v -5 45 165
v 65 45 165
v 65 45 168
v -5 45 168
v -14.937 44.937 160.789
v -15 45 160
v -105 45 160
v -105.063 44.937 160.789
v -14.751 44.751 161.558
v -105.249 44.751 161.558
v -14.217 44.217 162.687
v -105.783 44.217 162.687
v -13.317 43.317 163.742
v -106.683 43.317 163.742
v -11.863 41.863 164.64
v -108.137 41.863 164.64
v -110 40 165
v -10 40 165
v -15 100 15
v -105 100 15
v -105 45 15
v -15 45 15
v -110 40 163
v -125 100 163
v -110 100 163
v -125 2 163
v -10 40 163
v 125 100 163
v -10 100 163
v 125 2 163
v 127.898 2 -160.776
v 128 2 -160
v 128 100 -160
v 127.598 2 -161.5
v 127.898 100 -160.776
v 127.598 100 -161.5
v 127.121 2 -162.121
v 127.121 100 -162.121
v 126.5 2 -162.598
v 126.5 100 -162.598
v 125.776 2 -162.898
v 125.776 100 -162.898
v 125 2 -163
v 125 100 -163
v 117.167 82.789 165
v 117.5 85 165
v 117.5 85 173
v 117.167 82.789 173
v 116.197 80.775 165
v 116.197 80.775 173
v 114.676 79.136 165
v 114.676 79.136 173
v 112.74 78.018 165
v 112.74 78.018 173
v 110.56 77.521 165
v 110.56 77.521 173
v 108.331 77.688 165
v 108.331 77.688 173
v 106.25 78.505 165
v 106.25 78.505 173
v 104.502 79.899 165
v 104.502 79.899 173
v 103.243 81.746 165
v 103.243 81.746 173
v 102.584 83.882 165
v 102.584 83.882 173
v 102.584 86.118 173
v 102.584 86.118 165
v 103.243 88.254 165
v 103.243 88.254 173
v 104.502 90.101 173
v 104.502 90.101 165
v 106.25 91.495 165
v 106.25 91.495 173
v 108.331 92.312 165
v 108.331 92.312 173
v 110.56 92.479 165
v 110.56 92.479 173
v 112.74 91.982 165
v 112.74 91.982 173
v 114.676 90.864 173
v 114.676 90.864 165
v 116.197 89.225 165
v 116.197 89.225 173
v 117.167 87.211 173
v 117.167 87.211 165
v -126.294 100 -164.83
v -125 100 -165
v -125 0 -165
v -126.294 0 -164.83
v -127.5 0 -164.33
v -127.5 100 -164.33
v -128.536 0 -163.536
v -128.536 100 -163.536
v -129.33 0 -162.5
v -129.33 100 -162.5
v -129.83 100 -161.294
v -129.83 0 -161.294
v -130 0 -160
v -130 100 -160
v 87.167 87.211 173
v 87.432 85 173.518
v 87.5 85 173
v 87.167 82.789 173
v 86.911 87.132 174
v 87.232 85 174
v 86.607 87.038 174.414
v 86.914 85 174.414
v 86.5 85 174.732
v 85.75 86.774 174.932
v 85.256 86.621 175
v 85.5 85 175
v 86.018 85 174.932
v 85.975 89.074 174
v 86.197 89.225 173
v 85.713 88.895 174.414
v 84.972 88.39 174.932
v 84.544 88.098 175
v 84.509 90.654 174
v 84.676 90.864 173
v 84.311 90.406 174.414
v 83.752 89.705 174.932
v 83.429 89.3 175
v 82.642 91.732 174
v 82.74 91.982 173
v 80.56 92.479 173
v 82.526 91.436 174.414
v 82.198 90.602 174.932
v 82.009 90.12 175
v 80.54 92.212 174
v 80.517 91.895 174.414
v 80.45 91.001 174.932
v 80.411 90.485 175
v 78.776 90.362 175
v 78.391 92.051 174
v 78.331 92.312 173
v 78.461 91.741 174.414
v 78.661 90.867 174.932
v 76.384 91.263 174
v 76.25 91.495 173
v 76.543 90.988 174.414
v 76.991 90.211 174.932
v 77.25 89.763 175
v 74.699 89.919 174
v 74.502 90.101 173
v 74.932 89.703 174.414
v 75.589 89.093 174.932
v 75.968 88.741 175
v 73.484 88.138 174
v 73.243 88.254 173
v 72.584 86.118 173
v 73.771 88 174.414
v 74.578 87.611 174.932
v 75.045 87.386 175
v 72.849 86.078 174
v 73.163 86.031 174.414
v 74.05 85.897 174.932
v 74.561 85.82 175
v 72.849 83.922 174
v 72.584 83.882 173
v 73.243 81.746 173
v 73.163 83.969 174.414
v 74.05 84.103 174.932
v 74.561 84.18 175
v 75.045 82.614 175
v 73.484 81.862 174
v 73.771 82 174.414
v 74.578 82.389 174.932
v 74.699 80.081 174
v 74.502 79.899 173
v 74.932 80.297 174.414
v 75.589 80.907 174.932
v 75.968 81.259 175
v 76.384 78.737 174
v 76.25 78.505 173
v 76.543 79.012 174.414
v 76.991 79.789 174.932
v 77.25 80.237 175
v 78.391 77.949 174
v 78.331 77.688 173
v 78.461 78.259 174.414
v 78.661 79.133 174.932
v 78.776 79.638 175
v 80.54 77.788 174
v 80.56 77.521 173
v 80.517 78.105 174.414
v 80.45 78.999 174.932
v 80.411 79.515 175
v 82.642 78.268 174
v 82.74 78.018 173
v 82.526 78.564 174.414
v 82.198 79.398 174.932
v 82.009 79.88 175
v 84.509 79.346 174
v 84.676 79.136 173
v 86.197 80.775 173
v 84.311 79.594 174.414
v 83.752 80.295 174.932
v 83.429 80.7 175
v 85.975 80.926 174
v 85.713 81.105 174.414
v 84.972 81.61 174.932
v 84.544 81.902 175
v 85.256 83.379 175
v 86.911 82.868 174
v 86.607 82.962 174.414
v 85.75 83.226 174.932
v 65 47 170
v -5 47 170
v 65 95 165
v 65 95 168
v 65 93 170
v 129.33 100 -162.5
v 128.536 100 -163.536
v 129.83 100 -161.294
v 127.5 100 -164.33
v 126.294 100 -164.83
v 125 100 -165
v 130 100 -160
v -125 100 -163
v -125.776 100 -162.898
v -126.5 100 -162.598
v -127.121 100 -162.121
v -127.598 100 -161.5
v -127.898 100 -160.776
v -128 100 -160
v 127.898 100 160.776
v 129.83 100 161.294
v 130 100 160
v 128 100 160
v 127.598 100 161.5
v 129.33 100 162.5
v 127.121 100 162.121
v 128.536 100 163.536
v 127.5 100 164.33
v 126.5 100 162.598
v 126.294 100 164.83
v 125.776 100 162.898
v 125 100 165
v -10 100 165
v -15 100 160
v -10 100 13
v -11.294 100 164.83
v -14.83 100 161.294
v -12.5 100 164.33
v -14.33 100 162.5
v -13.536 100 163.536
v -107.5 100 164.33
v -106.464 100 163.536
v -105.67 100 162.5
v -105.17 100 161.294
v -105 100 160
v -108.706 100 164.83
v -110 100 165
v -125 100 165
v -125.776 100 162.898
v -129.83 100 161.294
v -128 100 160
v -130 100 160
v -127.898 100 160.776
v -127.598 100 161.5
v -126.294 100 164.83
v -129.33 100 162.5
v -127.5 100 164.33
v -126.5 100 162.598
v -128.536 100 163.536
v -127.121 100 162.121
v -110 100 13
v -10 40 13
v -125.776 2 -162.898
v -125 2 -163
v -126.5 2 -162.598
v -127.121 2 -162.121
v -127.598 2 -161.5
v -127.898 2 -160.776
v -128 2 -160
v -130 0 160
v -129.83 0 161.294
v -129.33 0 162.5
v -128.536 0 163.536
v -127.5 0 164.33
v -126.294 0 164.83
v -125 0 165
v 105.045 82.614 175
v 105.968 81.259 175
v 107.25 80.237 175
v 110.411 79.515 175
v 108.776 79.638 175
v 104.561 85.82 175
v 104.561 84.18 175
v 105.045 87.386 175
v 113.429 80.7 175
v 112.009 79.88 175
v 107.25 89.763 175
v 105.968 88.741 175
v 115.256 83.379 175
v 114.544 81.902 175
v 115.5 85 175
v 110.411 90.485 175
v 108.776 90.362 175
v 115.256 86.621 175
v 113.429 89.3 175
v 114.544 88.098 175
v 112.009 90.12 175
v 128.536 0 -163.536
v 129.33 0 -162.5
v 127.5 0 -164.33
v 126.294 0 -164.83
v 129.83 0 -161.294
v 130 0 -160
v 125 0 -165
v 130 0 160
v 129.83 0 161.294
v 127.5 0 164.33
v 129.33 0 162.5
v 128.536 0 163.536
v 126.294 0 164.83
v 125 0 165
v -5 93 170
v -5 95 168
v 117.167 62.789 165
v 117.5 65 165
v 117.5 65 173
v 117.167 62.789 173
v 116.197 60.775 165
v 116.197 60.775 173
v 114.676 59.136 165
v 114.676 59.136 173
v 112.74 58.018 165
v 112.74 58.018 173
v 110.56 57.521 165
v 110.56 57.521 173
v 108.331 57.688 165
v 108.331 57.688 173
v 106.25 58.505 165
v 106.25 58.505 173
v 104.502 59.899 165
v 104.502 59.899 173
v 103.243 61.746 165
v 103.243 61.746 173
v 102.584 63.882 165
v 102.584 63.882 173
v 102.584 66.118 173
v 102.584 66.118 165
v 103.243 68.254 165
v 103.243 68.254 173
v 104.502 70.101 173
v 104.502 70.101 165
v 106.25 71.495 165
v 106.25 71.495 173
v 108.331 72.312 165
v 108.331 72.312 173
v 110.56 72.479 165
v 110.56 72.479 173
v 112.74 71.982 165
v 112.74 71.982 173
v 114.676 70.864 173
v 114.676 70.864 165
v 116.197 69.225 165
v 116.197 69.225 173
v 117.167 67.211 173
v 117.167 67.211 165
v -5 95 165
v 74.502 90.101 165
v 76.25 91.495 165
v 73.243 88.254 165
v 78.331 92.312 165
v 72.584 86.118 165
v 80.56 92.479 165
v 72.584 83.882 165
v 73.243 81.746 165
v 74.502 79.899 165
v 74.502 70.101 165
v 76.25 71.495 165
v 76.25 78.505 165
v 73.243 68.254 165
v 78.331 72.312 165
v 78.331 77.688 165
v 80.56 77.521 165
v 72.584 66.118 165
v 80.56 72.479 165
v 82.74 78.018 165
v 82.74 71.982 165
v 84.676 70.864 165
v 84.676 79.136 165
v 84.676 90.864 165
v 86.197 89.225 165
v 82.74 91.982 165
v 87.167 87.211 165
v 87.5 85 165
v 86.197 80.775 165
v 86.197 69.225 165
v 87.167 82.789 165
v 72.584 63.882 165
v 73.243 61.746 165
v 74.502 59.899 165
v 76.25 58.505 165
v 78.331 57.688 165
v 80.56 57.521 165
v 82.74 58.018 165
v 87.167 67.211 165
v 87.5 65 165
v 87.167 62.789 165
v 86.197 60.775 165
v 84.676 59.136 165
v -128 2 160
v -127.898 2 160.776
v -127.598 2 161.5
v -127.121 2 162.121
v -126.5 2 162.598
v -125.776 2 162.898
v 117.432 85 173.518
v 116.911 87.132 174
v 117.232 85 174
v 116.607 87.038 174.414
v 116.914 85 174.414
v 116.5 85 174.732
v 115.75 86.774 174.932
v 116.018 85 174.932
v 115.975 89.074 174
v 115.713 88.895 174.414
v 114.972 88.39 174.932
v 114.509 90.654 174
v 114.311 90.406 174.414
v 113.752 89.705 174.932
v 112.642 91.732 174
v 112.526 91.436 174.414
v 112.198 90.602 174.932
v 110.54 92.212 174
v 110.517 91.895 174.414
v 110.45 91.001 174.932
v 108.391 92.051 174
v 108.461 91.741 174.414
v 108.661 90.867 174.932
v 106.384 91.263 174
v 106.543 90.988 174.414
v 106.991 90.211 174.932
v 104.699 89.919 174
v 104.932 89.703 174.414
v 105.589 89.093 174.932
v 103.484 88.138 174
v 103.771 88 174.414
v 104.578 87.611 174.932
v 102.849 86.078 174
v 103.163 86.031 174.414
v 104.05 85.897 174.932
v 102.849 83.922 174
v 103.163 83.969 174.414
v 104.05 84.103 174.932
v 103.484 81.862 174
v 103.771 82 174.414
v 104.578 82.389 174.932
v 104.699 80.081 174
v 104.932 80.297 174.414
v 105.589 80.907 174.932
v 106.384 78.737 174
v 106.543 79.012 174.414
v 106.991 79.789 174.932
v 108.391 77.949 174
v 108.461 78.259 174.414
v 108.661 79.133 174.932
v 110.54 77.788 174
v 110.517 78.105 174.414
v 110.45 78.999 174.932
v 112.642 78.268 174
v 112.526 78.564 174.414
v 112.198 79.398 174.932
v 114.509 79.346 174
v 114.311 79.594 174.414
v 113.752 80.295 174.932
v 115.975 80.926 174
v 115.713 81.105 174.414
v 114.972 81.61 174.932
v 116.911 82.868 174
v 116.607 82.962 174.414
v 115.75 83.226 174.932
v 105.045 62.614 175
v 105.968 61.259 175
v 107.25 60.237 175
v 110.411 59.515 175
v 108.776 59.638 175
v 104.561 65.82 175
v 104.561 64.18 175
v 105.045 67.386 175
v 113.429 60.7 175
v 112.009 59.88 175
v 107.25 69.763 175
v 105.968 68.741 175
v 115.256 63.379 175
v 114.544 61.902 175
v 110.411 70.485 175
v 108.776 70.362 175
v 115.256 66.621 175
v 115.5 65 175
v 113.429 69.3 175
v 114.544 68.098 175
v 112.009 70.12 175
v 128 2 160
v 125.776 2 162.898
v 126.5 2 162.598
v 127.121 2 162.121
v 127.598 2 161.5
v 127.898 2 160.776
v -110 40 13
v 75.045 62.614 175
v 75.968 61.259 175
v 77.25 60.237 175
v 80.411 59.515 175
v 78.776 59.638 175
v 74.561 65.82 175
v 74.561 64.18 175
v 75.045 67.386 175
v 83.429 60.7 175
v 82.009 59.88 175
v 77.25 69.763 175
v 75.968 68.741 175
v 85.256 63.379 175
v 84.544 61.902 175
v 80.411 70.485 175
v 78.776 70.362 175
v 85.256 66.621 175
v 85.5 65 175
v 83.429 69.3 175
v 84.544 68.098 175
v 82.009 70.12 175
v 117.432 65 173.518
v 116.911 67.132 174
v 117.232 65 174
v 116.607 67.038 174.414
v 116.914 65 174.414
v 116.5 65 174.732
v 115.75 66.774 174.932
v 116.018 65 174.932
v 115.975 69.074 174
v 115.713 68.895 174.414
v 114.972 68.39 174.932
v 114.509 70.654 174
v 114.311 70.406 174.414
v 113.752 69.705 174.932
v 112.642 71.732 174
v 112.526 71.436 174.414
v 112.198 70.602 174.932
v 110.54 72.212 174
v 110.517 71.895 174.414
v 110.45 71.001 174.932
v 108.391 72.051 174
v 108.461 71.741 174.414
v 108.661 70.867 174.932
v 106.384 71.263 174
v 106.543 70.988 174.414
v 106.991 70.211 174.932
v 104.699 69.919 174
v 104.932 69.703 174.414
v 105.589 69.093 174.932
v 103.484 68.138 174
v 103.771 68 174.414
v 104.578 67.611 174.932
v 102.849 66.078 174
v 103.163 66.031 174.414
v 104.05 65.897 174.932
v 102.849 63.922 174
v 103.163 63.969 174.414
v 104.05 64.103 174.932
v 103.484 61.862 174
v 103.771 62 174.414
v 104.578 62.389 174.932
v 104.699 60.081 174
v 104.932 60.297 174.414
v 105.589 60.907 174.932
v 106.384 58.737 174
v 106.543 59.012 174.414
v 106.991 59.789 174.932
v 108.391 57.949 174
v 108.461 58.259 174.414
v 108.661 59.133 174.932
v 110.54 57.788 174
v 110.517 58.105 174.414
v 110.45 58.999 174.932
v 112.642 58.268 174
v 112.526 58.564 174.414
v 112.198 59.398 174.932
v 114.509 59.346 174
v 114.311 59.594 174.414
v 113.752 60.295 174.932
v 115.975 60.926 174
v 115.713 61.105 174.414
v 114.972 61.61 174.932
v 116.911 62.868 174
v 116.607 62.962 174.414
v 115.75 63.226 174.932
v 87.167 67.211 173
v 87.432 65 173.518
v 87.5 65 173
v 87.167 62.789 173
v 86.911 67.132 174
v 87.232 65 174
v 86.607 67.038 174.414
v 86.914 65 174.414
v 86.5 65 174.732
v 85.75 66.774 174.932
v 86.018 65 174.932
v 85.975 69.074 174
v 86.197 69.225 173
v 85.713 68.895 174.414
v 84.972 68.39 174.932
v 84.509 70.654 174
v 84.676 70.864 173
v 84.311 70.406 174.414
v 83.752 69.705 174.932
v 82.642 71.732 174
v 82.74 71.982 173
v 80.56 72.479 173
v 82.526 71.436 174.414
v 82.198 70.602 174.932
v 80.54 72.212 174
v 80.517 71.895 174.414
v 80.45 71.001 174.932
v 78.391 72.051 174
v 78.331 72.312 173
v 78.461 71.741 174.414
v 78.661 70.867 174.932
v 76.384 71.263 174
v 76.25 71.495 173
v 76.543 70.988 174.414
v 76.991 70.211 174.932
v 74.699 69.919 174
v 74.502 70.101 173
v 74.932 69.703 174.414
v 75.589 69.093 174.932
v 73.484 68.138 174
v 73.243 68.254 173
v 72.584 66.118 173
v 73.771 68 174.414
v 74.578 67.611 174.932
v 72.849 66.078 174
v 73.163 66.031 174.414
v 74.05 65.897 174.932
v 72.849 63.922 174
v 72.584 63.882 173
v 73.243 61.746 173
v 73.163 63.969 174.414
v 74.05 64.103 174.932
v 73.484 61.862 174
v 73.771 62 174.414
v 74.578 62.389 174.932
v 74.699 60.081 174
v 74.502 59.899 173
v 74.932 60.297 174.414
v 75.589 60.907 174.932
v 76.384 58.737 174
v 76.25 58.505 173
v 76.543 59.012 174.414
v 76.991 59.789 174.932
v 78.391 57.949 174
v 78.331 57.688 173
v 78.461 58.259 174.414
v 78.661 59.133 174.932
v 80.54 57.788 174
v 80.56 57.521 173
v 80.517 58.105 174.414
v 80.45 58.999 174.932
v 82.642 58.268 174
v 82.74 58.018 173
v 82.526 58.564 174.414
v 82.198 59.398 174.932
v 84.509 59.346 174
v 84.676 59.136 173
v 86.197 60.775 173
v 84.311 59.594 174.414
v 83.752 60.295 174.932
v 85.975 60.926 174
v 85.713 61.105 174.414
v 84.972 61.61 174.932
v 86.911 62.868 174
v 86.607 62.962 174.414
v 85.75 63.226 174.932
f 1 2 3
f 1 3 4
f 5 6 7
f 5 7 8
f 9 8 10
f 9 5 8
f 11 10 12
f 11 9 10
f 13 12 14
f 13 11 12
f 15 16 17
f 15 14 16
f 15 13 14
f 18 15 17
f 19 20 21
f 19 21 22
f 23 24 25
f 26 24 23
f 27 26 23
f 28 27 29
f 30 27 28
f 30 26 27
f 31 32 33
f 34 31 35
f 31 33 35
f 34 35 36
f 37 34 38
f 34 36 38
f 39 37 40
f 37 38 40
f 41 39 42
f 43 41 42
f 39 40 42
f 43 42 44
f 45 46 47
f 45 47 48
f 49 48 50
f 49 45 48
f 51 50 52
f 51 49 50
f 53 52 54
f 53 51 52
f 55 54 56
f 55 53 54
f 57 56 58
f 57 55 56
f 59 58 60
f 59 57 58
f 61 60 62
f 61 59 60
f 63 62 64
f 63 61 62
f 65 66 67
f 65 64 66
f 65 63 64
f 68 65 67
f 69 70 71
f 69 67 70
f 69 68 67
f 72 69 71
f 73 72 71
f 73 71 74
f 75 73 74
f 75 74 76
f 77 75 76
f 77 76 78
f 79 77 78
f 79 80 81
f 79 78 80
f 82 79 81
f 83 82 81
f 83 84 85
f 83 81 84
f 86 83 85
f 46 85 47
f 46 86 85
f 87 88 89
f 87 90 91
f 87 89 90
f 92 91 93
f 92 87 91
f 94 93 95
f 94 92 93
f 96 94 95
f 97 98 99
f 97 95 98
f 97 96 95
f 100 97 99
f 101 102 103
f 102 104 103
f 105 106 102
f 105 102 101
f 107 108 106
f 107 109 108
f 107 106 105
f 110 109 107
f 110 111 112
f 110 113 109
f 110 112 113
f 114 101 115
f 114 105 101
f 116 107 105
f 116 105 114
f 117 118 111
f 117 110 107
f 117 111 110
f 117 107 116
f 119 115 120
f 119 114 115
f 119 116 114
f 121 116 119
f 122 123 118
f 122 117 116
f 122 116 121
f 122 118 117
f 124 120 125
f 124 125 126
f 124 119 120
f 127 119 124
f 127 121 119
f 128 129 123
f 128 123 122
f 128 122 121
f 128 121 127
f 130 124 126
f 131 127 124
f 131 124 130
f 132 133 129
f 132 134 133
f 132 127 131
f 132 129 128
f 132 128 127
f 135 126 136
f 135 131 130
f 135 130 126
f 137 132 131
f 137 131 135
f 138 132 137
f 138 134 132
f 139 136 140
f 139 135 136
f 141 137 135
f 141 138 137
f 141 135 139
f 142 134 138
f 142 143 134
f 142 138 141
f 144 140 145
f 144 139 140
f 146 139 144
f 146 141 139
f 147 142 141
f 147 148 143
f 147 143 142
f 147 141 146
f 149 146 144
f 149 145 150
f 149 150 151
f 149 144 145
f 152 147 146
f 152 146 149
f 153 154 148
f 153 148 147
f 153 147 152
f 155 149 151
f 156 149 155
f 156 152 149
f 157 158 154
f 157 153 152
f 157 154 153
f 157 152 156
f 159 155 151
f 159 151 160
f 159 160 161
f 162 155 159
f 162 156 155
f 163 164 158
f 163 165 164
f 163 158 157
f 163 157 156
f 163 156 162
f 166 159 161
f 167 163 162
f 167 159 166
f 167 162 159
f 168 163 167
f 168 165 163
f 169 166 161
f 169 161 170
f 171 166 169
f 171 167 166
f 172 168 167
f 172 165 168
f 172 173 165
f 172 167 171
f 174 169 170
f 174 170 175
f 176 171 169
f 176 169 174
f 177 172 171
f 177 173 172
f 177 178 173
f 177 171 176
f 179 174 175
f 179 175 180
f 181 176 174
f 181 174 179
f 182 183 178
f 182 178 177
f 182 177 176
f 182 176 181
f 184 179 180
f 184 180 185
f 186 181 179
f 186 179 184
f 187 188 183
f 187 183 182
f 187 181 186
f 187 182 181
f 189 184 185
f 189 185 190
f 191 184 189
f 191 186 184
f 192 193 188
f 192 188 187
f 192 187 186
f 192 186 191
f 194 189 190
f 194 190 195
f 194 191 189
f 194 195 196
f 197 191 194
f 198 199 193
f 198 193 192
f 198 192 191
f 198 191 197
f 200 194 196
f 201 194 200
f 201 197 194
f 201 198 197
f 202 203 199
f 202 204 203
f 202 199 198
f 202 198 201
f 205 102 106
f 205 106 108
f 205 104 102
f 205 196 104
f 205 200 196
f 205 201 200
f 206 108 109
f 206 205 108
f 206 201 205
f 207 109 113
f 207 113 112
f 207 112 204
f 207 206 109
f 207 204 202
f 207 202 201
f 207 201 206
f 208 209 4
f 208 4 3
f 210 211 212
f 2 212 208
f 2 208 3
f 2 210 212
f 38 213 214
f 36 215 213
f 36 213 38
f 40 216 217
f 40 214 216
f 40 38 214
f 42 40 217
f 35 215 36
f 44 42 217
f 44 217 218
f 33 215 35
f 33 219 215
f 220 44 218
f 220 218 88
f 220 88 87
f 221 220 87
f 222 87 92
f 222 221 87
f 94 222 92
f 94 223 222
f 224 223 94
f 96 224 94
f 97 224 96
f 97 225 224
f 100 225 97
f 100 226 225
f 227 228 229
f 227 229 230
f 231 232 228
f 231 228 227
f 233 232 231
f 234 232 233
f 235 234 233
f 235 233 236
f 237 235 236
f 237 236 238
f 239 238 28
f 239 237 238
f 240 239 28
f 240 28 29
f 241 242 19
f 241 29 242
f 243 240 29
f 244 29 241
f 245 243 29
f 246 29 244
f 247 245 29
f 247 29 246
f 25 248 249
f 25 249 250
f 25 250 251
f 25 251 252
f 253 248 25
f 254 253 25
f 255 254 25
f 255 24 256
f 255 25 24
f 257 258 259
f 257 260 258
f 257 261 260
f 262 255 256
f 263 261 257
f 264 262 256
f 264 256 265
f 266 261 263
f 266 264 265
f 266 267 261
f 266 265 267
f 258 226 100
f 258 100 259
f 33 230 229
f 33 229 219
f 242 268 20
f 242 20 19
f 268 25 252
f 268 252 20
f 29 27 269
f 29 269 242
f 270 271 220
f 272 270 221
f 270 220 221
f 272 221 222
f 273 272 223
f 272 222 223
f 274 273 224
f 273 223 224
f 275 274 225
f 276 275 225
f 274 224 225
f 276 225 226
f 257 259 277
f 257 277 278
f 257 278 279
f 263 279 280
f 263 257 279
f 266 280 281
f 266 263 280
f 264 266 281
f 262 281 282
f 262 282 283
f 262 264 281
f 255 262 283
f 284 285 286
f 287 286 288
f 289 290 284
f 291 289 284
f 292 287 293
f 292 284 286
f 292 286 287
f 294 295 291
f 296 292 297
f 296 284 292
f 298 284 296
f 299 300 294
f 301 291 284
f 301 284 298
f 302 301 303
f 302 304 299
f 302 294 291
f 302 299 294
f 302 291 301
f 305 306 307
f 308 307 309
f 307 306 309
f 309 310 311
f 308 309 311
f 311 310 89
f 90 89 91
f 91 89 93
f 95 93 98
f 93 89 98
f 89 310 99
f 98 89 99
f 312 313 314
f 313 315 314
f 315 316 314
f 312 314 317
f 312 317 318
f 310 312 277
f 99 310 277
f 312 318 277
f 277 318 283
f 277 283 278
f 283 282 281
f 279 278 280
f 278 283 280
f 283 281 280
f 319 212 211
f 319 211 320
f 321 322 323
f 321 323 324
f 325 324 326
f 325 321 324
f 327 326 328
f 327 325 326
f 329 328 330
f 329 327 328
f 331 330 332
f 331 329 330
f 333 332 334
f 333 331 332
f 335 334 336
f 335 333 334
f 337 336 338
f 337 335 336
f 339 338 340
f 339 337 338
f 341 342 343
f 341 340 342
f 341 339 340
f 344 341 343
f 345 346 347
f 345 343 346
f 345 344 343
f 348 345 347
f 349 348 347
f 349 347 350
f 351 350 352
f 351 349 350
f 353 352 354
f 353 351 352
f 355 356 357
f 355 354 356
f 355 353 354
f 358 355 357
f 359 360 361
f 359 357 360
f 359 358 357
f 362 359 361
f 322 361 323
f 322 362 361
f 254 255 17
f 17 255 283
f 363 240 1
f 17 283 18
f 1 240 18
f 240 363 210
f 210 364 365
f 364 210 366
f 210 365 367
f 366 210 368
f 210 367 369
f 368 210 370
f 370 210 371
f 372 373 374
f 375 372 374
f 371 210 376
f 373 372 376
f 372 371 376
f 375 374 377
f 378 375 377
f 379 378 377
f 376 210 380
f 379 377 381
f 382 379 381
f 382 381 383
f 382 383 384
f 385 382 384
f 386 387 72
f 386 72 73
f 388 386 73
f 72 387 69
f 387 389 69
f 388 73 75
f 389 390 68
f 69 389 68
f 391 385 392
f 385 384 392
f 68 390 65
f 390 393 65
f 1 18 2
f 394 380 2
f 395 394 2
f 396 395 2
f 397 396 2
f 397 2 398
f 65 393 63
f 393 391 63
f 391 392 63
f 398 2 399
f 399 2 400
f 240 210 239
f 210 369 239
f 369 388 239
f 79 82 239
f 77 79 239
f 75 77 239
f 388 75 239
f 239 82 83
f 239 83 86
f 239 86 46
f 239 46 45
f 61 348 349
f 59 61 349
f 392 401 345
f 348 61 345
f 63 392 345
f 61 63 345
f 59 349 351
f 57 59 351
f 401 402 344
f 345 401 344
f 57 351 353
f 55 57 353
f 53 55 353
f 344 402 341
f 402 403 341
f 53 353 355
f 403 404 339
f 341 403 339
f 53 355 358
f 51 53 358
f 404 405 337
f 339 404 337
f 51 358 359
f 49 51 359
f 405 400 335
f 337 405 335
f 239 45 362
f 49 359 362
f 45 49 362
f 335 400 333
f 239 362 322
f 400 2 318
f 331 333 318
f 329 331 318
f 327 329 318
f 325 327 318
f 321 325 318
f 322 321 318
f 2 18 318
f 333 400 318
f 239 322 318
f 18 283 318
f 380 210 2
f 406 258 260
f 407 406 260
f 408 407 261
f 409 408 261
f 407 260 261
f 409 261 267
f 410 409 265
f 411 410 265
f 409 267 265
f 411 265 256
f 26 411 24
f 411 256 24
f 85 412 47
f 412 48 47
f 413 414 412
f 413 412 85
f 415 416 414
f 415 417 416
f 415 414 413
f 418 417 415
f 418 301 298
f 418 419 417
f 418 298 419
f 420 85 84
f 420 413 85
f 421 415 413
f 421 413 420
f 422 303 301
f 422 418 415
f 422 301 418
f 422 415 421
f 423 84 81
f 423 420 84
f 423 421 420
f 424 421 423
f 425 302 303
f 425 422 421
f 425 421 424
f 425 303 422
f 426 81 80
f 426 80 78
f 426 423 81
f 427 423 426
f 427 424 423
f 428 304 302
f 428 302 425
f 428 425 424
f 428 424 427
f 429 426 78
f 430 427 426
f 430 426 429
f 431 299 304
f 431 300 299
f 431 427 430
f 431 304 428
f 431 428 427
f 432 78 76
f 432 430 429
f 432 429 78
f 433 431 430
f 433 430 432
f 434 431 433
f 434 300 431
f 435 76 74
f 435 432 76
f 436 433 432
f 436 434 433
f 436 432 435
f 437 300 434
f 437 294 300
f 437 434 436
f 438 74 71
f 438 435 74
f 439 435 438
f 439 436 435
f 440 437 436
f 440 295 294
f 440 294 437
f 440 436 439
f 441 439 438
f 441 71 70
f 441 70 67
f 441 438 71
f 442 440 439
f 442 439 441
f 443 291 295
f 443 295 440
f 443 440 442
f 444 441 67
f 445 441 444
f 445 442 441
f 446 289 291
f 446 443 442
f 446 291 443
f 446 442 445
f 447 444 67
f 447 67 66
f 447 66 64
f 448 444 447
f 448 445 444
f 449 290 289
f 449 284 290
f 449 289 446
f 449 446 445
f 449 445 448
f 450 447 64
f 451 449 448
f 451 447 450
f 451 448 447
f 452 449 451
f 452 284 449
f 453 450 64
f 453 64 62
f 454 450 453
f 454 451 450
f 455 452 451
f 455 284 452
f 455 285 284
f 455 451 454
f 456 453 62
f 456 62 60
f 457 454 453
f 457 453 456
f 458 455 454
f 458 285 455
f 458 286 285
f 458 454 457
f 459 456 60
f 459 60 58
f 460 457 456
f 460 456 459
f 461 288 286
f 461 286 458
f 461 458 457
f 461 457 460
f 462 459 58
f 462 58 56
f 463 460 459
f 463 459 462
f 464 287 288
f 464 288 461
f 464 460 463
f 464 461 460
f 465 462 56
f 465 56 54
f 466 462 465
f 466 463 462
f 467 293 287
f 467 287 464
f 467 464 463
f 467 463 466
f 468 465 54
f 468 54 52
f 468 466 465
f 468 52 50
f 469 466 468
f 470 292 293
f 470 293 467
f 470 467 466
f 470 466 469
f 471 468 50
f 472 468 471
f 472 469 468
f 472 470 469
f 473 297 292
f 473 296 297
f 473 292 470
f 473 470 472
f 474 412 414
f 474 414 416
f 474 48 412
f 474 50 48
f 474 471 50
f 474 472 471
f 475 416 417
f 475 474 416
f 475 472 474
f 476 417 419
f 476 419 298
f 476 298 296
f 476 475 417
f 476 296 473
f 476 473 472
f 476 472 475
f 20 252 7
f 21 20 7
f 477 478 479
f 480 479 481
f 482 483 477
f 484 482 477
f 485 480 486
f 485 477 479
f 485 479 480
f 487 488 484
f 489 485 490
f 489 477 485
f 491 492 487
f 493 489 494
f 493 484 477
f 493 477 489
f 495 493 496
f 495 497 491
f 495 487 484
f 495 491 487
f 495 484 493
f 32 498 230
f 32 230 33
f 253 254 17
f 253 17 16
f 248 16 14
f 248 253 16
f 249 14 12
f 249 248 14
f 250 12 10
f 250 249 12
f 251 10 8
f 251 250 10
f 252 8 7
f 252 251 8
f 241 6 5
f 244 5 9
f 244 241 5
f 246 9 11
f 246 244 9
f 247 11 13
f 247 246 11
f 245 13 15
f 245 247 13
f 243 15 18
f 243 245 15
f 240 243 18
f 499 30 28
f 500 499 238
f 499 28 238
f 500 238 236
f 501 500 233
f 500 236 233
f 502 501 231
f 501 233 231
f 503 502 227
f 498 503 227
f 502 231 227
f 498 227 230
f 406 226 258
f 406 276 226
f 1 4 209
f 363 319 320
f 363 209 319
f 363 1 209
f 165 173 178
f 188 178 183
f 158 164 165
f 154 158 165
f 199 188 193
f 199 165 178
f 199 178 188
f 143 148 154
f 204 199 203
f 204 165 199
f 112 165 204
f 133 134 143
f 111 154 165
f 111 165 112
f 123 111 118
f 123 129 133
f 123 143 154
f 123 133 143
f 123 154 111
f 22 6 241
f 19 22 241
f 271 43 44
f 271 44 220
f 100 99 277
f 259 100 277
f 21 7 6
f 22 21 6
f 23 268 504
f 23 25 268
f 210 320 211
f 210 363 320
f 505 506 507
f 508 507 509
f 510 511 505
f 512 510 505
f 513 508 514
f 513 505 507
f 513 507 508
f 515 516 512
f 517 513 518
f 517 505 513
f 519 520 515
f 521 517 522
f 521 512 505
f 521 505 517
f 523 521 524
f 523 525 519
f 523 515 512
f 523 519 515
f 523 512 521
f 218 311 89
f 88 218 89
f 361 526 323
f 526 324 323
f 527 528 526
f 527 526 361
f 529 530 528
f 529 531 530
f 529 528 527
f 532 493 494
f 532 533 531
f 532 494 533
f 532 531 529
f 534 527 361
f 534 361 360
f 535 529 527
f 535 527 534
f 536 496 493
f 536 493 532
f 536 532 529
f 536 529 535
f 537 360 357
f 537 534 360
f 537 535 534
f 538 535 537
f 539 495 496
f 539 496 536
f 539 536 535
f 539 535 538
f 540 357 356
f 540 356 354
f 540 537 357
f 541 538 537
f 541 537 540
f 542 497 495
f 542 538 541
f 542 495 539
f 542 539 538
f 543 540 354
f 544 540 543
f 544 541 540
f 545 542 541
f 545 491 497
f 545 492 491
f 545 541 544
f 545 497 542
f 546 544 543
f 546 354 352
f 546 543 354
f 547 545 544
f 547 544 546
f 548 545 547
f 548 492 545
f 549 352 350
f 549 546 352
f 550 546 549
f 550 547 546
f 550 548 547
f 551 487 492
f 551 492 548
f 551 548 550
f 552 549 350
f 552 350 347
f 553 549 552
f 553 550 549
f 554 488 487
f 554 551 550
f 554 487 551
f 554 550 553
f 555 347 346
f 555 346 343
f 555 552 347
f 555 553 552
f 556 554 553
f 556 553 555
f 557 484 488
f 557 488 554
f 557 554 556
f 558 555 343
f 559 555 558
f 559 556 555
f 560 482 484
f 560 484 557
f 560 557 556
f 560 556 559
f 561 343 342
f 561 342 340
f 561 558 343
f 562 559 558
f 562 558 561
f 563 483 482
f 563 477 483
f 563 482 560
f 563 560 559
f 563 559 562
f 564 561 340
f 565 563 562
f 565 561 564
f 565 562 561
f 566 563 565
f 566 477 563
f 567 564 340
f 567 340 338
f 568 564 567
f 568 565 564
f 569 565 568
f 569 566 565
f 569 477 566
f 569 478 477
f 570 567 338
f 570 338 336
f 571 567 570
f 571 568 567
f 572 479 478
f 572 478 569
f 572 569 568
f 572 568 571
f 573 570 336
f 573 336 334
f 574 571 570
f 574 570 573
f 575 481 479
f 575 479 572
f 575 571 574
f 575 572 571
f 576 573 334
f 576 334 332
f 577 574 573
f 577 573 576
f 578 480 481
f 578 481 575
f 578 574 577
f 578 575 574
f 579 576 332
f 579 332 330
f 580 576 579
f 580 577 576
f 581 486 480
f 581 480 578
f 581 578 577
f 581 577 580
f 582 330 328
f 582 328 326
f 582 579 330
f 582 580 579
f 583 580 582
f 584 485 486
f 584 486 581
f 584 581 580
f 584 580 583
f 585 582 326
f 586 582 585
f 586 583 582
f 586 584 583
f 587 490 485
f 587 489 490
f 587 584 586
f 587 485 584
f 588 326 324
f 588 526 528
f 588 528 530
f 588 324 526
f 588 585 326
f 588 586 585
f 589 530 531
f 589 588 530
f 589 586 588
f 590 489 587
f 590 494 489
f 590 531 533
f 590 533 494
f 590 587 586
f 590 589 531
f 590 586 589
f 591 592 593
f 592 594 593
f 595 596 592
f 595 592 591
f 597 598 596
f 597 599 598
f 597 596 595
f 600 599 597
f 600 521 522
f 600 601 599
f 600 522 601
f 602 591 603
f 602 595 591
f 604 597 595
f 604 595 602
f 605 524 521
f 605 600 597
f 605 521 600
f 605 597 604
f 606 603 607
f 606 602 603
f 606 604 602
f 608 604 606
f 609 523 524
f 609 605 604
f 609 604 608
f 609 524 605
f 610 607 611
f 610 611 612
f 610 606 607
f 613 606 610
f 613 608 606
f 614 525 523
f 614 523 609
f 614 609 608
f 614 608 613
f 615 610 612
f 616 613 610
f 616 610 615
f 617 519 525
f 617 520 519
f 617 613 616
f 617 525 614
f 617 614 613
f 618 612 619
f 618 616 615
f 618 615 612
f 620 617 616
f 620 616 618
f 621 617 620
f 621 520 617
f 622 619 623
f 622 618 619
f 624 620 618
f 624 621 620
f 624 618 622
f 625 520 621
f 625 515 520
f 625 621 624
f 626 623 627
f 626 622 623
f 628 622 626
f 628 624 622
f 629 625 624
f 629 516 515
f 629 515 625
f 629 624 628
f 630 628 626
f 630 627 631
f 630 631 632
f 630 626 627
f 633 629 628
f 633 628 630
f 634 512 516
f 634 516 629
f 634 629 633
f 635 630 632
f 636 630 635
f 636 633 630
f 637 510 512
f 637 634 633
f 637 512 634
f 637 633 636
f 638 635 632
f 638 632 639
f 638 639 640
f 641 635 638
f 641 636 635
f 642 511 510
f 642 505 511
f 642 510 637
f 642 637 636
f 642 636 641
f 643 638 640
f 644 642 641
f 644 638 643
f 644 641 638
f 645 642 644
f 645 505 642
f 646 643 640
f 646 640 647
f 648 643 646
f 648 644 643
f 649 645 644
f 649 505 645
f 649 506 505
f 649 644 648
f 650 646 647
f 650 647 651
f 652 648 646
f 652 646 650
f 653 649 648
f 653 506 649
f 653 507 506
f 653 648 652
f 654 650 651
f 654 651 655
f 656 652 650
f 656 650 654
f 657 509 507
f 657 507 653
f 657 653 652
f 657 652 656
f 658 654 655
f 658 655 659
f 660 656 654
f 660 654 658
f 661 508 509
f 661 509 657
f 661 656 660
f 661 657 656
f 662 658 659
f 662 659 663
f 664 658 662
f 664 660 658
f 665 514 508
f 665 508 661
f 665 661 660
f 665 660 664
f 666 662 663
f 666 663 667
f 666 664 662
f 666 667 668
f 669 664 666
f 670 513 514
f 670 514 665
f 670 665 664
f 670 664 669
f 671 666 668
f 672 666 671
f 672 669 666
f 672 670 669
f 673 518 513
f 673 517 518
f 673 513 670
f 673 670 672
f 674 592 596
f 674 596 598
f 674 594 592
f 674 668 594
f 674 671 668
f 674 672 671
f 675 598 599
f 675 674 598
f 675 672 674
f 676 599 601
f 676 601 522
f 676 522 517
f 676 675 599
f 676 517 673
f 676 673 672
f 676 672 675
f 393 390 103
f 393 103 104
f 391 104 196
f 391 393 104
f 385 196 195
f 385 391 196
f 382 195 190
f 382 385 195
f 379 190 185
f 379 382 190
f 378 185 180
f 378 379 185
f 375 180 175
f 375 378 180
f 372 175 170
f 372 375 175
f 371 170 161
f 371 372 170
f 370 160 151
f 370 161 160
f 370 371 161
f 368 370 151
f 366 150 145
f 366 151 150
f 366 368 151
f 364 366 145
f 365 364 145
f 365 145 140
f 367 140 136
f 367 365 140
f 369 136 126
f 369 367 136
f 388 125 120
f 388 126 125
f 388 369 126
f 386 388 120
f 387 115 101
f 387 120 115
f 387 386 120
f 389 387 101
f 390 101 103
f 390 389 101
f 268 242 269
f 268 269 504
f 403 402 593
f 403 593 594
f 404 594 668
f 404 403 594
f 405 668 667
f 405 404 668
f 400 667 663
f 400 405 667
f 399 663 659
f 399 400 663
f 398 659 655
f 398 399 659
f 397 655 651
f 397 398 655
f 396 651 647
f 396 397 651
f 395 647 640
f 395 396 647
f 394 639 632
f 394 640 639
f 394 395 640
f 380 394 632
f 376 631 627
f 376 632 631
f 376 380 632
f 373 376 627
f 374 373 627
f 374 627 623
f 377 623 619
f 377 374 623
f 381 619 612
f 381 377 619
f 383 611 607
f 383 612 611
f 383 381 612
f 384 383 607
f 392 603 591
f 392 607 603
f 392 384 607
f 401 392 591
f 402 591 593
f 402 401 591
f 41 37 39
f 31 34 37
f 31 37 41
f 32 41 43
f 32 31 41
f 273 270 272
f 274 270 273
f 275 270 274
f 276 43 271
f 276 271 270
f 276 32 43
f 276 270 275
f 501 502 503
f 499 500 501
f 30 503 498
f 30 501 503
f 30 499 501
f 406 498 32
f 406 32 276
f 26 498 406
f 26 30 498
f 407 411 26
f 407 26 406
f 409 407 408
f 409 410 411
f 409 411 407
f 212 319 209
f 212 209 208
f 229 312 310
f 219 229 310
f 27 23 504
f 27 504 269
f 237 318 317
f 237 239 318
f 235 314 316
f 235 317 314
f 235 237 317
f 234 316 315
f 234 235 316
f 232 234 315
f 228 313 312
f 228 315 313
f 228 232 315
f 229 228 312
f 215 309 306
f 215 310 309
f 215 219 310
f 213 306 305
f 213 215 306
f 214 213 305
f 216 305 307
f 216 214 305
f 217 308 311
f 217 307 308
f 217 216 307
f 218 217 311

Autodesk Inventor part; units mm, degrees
ref_plane "YZ Plane" through (0, 0, 0) normal (1, 0, 0) x (0, 1, 0)
ref_plane "XZ Plane" through (0, 0, 0) normal (0, 1, 0) x (-1, 0, 0)
ref_plane "XY Plane" through (0, 0, 0) normal (0, 0, 1) x (1, 0, 0)
sketch "Sketch1" plane through (0, 0, 0) normal (0, 1, 0) x (-1, 0, 0)
  line L0 (130, 165) -> (-130, 165)
  line L1 (-130, 165) -> (-130, -165)
  line L2 (-130, -165) -> (130, -165)
  line L3 (130, -165) -> (130, 165)
  point P0 (0, 0)
  point P1 (0, -165)
  point P2 (130, 0)
  dimension "d0" = 260
  dimension "d1" = 330
extrude "Extrusion1" add sketch "Sketch1" along normal blind 100
fillet "Fillet1" radius 5 4 edges at (130, 50, 165) (130, 50, -165) (-130, 50, -165) (-130, 50, 165)
shell "Shell1" thickness 2 removed faces 1 at (43.3333, 100, 53.3333)
sketch "Sketch3" plane through (128, 96, 163) normal (0, 0, -1) x (-1, 0, 0)
  line L0 (251.5, 4) -> (4.5, 4) projected
  line L1 (138, 4) -> (238, 4)
  line L2 (238, 4) -> (238, -56)
  line L3 (238, -56) -> (138, -56)
  line L4 (138, -56) -> (138, 4)
  line L5 (253, -96) -> (253, 4) projected
  point P0 (128, -96)
  point P1 (253, 2)
  dimension "d13" = 100
  dimension "d14" = 60
  dimension "d15" = 15
extrude "Extrusion3" add sketch "Sketch3" along normal blind 150
sketch "Sketch4" plane through (-125, 0, 165) normal (0, 0, 1) x (1, 0, 0)
  line L0 (0, 0) -> (0, 100) projected
  line L1 (0, 0) -> (250, 0) projected
  line L2 (250, 100) -> (250, 0) projected
  line L3 (15, 100) -> (115, 100) projected
  line L4 (15, 40) -> (15, 100) projected
  line L5 (15, 100) -> (115, 100) projected
  line L6 (115, 100) -> (115, 40) projected
  line L7 (115, 40) -> (15, 40) projected
  line L8 (20, 45) -> (110, 45)
  line L9 (110, 45) -> (110, 109.7523)
  line L10 (110, 109.7523) -> (20, 109.7523)
  line L11 (20, 109.7523) -> (20, 45)
  line L12 (0, 100) -> (250, 100) projected
  line L13 (0, 100) -> (-3, 100) projected
  line L14 (-3, 100) -> (0, 100) projected
  line L15 (0, 100) -> (250, 100) projected
  line L16 (250, 100) -> (253, 100) projected
  line L17 (253, 100) -> (250, 100) projected
  line L18 (250, 100) -> (115, 100) projected
  line L19 (15, 100) -> (0, 100) projected
  point P0 (125, 0)
  dimension "d18" = 5
  dimension "d19" = 5
  dimension "d20" = 5
extrude "Extrusion4" cut sketch "Sketch4" against normal blind 150 contours L11 L10 L9 L3 | L3 L9 L8 L11
fillet "Fillet3" radius 5 3 edges at (-60, 45, 165) (-105, 72.5, 165) (-15, 72.5, 165)
sketch "Sketch5" plane through (-125, 0, 165) normal (0, 0, 1) x (1, 0, 0)
  circle A0 centre (235, 85) radius 7.5
  line L0 (115, 100) -> (250, 100) projected
  line L1 (250, 100) -> (250, 0) projected
  circle A1 centre (205, 85) radius 7.5
  circle A2 centre (235, 65) radius 7.5
  circle A3 centre (205, 65) radius 7.5
  point P0 (125, 0)
  dimension "d24" = 15
  dimension "d25" = 15
  dimension "d26" = 15
  dimension "d29" = 30
  dimension "d32" = 20
extrude "Extrusion5" add sketch "Sketch5" along normal blind 10
fillet "Fillet4" radius 2 4 edges at (102.5, 85, 175) (102.5, 65, 175) (72.5, 65, 175) (72.5, 85, 175)
sketch "Sketch6" plane through (-125, 0, 165) normal (0, 0, 1) x (1, 0, 0)
  line L0 (120, 95) -> (190, 95)
  line L1 (190, 95) -> (190, 45)
  line L2 (190, 45) -> (120, 45)
  line L3 (120, 45) -> (120, 95)
  line L4 (115, 100) -> (250, 100) projected
  line L5 (115, 40) -> (115, 100) projected
  point P0 (125, 0)
  dimension "d38" = 5
  dimension "d39" = 5
  dimension "d40" = 70
  dimension "d41" = 50
extrude "Extrusion6" add sketch "Sketch6" along normal blind 5
chamfer "Chamfer1" distance 2 angle 45 2 edges at (30, 95, 170) (30, 45, 170)
properties part number "case_botten"
